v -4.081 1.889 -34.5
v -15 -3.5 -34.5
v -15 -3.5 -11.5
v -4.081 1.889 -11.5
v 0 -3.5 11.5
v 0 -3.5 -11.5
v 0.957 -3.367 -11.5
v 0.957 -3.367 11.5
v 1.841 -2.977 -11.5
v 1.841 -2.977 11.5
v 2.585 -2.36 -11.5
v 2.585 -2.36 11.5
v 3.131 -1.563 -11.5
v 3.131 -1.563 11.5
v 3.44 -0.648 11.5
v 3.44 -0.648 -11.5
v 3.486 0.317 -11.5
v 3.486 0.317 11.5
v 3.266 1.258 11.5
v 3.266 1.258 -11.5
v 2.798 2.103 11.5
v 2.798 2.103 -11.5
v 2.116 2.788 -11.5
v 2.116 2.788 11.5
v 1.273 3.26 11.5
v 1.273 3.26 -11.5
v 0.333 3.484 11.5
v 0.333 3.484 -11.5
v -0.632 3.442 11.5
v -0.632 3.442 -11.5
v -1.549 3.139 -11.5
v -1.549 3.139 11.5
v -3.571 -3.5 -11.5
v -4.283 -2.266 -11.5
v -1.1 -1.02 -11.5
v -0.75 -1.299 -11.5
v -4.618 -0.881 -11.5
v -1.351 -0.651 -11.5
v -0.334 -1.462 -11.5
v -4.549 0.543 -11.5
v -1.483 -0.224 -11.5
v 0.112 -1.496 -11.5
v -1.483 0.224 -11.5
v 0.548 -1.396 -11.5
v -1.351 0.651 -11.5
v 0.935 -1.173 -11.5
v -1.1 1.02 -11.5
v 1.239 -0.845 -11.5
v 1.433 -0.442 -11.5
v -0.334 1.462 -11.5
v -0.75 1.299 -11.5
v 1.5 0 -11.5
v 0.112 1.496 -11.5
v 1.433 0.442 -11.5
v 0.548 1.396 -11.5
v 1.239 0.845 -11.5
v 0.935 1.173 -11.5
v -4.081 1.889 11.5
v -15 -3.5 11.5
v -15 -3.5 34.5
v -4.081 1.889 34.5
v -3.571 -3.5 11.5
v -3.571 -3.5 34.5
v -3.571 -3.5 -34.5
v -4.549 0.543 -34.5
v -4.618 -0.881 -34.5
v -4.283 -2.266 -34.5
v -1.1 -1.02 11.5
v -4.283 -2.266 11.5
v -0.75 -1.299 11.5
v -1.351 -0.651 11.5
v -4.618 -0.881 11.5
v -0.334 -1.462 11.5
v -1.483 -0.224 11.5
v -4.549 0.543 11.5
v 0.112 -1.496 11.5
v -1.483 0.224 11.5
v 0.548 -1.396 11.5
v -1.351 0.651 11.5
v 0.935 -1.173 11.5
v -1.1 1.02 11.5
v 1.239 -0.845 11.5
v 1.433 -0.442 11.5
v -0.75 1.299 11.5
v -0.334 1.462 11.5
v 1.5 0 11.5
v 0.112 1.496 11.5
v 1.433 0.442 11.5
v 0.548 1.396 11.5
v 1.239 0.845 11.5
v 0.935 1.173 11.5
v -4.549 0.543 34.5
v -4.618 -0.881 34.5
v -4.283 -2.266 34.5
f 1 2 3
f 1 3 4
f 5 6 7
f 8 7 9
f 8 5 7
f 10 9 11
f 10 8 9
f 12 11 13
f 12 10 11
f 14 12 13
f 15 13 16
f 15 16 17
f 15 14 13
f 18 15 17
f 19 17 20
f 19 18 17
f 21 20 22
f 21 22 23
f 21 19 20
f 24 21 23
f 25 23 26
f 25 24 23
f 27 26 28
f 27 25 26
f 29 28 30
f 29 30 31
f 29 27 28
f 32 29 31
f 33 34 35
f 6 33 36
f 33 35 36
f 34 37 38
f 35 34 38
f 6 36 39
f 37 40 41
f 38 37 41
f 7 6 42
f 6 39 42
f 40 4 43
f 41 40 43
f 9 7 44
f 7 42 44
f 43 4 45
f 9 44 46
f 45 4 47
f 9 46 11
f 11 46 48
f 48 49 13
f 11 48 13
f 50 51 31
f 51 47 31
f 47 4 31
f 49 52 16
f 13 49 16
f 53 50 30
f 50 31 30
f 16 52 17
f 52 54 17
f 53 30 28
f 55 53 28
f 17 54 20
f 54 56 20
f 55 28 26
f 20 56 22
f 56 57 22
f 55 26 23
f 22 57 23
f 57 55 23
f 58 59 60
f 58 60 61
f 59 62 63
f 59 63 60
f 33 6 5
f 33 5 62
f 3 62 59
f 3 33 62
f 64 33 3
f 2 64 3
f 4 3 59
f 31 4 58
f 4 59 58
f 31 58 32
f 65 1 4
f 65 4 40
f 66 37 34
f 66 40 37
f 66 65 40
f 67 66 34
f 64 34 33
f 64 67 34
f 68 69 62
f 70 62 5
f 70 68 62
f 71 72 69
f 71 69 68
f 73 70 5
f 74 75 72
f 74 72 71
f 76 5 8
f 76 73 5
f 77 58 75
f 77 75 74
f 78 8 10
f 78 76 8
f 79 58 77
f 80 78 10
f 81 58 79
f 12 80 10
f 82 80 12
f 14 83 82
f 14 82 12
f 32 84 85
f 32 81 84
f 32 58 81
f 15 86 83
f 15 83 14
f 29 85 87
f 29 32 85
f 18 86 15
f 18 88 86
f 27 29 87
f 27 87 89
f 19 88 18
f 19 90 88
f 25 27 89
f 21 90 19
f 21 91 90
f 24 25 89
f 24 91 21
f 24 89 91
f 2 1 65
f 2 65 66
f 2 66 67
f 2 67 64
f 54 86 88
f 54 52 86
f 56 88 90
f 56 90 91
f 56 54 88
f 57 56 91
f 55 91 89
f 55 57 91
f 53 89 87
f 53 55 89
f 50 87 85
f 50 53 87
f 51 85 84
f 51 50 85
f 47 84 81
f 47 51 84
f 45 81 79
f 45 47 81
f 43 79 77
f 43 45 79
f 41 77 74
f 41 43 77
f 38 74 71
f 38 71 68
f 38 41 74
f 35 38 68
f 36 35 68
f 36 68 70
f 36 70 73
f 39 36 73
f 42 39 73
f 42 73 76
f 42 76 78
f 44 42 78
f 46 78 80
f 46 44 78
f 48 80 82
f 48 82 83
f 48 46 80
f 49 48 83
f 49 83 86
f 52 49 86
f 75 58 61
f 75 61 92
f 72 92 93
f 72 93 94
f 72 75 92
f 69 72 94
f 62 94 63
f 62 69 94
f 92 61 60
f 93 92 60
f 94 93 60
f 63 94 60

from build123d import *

# Parameters (mm, degrees)
SKETCH1_R           = 3.5
SKETCH1_R_2         = 1.5
BOSS_EXTRUDE1_DEPTH = 11.5
BOSS_EXTRUDE2_DEPTH = 11.5
BOSS_EXTRUDE3_DEPTH = 34.5


with BuildPart() as part:
    # Sketch1 → Boss-Extrude1 (new, symmetric)
    with BuildSketch(Plane.XY):
        Circle(SKETCH1_R)
        Circle(SKETCH1_R_2, mode=Mode.SUBTRACT)
    extrude(amount=BOSS_EXTRUDE1_DEPTH, both=True)

    # Sketch2 → Boss-Extrude2 (add, symmetric)
    with BuildSketch(Plane.XY):
        with BuildLine():
            Line((0, -3.5), (-15, -3.5))
            Line((-15, -3.5), (-1.548998946, 3.138566913))
            ThreePointArc((-1.548998946, 3.138566913), (-3.408444234, -0.795303655), (0, -3.5))
        make_face()
    extrude(amount=BOSS_EXTRUDE2_DEPTH, both=True)

    # Sketch3 → Boss-Extrude3 (add, symmetric)
    with BuildSketch(Plane(origin=(0, 0, 0), x_dir=(-1, 0, 0), z_dir=(0, 0, -1))):
        with BuildLine():
            Line((3.570714214, -3.5), (15, -3.5))
            Line((15, -3.5), (4.081424237, 1.888721293))
            ThreePointArc((4.081424237, 1.888721293), (4.618328991, -0.880724885), (3.570714214, -3.5))
        make_face()
    extrude(amount=BOSS_EXTRUDE3_DEPTH, both=True)


solid = part.part
